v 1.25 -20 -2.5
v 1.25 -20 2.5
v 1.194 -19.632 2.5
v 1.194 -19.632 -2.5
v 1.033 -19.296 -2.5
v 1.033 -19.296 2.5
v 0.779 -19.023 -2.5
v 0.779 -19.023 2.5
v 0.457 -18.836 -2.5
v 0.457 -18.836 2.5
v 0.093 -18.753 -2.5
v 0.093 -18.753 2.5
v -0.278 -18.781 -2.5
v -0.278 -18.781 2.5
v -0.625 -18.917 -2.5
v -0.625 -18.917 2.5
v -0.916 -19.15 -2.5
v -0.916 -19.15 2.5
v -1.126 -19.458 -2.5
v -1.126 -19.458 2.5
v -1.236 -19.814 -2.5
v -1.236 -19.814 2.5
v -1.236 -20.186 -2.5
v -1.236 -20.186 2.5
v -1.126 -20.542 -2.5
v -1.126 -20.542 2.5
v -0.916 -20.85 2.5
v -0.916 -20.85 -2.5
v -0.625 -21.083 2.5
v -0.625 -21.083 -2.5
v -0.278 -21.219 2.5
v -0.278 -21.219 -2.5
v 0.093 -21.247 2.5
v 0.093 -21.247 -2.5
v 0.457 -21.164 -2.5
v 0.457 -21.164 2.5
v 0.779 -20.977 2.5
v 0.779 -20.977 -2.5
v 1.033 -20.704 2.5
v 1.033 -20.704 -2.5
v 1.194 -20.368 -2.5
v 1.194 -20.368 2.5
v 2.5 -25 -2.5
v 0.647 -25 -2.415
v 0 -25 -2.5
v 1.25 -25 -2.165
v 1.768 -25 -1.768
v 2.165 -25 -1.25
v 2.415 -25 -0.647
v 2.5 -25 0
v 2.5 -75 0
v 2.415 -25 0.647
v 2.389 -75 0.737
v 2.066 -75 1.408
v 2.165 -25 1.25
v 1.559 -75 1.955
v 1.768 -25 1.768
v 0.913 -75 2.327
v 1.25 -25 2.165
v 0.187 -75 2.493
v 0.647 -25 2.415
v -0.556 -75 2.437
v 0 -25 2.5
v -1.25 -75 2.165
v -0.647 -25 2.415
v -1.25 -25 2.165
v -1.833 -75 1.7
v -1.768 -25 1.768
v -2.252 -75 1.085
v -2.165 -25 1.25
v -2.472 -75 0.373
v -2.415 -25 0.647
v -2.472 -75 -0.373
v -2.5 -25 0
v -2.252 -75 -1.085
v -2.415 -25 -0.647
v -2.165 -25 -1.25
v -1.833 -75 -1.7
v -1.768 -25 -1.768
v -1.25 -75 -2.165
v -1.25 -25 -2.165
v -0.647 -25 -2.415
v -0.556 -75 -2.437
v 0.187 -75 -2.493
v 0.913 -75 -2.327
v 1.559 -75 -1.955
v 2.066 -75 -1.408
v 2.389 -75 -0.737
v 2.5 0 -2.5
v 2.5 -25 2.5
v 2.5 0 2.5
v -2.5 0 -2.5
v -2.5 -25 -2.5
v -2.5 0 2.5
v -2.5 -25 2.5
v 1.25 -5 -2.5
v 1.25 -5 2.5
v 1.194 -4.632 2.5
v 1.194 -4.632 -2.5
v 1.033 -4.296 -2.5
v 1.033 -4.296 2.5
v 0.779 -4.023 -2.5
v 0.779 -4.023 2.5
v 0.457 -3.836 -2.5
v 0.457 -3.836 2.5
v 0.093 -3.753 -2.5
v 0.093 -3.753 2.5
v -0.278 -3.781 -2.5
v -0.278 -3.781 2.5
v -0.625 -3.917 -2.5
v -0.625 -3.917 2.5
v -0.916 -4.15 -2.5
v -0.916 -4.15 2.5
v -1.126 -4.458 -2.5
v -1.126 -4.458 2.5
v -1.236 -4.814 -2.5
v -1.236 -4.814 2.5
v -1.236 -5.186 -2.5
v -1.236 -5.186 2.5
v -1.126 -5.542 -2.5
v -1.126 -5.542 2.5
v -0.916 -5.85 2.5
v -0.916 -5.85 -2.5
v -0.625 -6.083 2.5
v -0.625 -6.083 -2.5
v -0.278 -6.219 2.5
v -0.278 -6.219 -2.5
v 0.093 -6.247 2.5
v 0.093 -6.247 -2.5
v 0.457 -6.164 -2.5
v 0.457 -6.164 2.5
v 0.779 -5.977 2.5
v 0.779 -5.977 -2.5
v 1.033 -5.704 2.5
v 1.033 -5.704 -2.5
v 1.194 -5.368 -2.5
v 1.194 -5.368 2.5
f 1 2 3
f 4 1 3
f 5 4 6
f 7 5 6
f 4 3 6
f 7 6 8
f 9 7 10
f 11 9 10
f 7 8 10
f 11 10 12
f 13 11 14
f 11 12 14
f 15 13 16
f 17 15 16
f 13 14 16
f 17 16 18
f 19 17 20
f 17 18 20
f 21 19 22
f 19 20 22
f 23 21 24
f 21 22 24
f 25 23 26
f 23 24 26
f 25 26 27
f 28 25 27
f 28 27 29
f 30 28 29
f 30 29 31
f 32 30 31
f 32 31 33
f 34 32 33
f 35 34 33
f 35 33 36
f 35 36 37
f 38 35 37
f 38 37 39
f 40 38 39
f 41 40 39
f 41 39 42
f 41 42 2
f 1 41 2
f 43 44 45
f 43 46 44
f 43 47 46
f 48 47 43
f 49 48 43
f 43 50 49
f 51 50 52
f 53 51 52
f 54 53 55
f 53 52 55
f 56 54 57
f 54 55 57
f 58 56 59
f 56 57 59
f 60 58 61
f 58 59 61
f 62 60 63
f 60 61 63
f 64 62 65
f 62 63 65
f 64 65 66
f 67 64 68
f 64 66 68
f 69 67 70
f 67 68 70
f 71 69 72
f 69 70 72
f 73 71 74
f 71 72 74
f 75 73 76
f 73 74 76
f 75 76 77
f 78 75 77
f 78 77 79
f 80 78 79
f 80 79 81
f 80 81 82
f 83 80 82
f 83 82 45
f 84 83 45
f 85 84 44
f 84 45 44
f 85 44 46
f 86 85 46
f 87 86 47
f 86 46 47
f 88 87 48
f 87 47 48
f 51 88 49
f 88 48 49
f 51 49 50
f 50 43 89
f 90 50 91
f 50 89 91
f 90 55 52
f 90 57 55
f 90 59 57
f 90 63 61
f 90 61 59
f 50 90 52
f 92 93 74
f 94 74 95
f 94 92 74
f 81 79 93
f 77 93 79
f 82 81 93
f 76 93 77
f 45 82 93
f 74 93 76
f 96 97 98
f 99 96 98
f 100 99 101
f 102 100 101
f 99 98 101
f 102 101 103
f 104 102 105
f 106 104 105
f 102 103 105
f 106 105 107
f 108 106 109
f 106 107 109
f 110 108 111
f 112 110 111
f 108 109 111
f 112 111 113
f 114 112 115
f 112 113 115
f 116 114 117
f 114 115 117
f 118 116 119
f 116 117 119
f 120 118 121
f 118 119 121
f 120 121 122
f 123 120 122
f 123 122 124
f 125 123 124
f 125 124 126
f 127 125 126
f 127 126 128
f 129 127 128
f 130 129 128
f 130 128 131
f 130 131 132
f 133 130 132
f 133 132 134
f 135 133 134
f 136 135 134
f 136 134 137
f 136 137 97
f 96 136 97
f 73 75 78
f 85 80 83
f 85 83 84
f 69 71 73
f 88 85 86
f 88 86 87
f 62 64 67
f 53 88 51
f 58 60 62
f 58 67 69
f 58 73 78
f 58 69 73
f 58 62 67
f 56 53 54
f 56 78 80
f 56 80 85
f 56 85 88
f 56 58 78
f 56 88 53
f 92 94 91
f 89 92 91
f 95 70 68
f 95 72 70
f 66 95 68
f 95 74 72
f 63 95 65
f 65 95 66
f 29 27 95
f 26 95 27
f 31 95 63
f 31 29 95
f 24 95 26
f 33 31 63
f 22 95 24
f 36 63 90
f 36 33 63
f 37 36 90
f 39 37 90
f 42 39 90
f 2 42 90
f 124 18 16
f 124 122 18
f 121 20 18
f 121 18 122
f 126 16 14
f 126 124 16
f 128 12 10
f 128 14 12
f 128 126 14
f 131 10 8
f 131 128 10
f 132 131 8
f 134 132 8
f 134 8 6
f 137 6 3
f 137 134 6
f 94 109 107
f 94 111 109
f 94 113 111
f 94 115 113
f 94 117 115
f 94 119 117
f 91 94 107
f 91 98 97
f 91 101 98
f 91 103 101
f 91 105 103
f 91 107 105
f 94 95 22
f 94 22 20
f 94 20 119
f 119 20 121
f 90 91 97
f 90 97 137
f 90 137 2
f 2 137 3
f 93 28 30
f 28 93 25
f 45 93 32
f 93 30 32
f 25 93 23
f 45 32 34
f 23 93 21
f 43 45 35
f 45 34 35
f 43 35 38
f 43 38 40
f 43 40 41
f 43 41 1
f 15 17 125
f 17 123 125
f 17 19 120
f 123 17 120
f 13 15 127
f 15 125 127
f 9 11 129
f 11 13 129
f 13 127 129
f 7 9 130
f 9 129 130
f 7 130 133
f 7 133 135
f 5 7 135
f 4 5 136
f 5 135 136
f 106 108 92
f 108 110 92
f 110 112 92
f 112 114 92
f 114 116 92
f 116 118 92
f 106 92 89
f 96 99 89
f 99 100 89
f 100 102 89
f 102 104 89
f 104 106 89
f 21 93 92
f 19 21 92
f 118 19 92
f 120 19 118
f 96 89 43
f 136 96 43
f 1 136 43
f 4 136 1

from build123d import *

# Parameters (mm, degrees)
F0_W     = 5
F0_H     = 5
F1_DEPTH = 25
F2_R     = 2.5
F3_DEPTH = 50
F4_R     = 1.25
F5_DEPTH = 25


with BuildPart() as f1:
    # F0 (on Front) → F1 (new body)
    with BuildSketch(Plane.XZ):
        Rectangle(F0_W, F0_H)
    extrude(amount=F1_DEPTH)

    # F2 (on face) → F3 (join)
    with BuildSketch(Plane.XZ.offset(25)):
        Circle(F2_R)
    extrude(amount=F3_DEPTH)

    # F4 (on face) → F5 (cut)
    with BuildSketch(Plane.XY.offset(2.5)):
        with Locations((0, -5)):
            Circle(F4_R)
        with Locations((0, -20)):
            Circle(F4_R)
    extrude(amount=-F5_DEPTH, mode=Mode.SUBTRACT)


solid = f1.part
